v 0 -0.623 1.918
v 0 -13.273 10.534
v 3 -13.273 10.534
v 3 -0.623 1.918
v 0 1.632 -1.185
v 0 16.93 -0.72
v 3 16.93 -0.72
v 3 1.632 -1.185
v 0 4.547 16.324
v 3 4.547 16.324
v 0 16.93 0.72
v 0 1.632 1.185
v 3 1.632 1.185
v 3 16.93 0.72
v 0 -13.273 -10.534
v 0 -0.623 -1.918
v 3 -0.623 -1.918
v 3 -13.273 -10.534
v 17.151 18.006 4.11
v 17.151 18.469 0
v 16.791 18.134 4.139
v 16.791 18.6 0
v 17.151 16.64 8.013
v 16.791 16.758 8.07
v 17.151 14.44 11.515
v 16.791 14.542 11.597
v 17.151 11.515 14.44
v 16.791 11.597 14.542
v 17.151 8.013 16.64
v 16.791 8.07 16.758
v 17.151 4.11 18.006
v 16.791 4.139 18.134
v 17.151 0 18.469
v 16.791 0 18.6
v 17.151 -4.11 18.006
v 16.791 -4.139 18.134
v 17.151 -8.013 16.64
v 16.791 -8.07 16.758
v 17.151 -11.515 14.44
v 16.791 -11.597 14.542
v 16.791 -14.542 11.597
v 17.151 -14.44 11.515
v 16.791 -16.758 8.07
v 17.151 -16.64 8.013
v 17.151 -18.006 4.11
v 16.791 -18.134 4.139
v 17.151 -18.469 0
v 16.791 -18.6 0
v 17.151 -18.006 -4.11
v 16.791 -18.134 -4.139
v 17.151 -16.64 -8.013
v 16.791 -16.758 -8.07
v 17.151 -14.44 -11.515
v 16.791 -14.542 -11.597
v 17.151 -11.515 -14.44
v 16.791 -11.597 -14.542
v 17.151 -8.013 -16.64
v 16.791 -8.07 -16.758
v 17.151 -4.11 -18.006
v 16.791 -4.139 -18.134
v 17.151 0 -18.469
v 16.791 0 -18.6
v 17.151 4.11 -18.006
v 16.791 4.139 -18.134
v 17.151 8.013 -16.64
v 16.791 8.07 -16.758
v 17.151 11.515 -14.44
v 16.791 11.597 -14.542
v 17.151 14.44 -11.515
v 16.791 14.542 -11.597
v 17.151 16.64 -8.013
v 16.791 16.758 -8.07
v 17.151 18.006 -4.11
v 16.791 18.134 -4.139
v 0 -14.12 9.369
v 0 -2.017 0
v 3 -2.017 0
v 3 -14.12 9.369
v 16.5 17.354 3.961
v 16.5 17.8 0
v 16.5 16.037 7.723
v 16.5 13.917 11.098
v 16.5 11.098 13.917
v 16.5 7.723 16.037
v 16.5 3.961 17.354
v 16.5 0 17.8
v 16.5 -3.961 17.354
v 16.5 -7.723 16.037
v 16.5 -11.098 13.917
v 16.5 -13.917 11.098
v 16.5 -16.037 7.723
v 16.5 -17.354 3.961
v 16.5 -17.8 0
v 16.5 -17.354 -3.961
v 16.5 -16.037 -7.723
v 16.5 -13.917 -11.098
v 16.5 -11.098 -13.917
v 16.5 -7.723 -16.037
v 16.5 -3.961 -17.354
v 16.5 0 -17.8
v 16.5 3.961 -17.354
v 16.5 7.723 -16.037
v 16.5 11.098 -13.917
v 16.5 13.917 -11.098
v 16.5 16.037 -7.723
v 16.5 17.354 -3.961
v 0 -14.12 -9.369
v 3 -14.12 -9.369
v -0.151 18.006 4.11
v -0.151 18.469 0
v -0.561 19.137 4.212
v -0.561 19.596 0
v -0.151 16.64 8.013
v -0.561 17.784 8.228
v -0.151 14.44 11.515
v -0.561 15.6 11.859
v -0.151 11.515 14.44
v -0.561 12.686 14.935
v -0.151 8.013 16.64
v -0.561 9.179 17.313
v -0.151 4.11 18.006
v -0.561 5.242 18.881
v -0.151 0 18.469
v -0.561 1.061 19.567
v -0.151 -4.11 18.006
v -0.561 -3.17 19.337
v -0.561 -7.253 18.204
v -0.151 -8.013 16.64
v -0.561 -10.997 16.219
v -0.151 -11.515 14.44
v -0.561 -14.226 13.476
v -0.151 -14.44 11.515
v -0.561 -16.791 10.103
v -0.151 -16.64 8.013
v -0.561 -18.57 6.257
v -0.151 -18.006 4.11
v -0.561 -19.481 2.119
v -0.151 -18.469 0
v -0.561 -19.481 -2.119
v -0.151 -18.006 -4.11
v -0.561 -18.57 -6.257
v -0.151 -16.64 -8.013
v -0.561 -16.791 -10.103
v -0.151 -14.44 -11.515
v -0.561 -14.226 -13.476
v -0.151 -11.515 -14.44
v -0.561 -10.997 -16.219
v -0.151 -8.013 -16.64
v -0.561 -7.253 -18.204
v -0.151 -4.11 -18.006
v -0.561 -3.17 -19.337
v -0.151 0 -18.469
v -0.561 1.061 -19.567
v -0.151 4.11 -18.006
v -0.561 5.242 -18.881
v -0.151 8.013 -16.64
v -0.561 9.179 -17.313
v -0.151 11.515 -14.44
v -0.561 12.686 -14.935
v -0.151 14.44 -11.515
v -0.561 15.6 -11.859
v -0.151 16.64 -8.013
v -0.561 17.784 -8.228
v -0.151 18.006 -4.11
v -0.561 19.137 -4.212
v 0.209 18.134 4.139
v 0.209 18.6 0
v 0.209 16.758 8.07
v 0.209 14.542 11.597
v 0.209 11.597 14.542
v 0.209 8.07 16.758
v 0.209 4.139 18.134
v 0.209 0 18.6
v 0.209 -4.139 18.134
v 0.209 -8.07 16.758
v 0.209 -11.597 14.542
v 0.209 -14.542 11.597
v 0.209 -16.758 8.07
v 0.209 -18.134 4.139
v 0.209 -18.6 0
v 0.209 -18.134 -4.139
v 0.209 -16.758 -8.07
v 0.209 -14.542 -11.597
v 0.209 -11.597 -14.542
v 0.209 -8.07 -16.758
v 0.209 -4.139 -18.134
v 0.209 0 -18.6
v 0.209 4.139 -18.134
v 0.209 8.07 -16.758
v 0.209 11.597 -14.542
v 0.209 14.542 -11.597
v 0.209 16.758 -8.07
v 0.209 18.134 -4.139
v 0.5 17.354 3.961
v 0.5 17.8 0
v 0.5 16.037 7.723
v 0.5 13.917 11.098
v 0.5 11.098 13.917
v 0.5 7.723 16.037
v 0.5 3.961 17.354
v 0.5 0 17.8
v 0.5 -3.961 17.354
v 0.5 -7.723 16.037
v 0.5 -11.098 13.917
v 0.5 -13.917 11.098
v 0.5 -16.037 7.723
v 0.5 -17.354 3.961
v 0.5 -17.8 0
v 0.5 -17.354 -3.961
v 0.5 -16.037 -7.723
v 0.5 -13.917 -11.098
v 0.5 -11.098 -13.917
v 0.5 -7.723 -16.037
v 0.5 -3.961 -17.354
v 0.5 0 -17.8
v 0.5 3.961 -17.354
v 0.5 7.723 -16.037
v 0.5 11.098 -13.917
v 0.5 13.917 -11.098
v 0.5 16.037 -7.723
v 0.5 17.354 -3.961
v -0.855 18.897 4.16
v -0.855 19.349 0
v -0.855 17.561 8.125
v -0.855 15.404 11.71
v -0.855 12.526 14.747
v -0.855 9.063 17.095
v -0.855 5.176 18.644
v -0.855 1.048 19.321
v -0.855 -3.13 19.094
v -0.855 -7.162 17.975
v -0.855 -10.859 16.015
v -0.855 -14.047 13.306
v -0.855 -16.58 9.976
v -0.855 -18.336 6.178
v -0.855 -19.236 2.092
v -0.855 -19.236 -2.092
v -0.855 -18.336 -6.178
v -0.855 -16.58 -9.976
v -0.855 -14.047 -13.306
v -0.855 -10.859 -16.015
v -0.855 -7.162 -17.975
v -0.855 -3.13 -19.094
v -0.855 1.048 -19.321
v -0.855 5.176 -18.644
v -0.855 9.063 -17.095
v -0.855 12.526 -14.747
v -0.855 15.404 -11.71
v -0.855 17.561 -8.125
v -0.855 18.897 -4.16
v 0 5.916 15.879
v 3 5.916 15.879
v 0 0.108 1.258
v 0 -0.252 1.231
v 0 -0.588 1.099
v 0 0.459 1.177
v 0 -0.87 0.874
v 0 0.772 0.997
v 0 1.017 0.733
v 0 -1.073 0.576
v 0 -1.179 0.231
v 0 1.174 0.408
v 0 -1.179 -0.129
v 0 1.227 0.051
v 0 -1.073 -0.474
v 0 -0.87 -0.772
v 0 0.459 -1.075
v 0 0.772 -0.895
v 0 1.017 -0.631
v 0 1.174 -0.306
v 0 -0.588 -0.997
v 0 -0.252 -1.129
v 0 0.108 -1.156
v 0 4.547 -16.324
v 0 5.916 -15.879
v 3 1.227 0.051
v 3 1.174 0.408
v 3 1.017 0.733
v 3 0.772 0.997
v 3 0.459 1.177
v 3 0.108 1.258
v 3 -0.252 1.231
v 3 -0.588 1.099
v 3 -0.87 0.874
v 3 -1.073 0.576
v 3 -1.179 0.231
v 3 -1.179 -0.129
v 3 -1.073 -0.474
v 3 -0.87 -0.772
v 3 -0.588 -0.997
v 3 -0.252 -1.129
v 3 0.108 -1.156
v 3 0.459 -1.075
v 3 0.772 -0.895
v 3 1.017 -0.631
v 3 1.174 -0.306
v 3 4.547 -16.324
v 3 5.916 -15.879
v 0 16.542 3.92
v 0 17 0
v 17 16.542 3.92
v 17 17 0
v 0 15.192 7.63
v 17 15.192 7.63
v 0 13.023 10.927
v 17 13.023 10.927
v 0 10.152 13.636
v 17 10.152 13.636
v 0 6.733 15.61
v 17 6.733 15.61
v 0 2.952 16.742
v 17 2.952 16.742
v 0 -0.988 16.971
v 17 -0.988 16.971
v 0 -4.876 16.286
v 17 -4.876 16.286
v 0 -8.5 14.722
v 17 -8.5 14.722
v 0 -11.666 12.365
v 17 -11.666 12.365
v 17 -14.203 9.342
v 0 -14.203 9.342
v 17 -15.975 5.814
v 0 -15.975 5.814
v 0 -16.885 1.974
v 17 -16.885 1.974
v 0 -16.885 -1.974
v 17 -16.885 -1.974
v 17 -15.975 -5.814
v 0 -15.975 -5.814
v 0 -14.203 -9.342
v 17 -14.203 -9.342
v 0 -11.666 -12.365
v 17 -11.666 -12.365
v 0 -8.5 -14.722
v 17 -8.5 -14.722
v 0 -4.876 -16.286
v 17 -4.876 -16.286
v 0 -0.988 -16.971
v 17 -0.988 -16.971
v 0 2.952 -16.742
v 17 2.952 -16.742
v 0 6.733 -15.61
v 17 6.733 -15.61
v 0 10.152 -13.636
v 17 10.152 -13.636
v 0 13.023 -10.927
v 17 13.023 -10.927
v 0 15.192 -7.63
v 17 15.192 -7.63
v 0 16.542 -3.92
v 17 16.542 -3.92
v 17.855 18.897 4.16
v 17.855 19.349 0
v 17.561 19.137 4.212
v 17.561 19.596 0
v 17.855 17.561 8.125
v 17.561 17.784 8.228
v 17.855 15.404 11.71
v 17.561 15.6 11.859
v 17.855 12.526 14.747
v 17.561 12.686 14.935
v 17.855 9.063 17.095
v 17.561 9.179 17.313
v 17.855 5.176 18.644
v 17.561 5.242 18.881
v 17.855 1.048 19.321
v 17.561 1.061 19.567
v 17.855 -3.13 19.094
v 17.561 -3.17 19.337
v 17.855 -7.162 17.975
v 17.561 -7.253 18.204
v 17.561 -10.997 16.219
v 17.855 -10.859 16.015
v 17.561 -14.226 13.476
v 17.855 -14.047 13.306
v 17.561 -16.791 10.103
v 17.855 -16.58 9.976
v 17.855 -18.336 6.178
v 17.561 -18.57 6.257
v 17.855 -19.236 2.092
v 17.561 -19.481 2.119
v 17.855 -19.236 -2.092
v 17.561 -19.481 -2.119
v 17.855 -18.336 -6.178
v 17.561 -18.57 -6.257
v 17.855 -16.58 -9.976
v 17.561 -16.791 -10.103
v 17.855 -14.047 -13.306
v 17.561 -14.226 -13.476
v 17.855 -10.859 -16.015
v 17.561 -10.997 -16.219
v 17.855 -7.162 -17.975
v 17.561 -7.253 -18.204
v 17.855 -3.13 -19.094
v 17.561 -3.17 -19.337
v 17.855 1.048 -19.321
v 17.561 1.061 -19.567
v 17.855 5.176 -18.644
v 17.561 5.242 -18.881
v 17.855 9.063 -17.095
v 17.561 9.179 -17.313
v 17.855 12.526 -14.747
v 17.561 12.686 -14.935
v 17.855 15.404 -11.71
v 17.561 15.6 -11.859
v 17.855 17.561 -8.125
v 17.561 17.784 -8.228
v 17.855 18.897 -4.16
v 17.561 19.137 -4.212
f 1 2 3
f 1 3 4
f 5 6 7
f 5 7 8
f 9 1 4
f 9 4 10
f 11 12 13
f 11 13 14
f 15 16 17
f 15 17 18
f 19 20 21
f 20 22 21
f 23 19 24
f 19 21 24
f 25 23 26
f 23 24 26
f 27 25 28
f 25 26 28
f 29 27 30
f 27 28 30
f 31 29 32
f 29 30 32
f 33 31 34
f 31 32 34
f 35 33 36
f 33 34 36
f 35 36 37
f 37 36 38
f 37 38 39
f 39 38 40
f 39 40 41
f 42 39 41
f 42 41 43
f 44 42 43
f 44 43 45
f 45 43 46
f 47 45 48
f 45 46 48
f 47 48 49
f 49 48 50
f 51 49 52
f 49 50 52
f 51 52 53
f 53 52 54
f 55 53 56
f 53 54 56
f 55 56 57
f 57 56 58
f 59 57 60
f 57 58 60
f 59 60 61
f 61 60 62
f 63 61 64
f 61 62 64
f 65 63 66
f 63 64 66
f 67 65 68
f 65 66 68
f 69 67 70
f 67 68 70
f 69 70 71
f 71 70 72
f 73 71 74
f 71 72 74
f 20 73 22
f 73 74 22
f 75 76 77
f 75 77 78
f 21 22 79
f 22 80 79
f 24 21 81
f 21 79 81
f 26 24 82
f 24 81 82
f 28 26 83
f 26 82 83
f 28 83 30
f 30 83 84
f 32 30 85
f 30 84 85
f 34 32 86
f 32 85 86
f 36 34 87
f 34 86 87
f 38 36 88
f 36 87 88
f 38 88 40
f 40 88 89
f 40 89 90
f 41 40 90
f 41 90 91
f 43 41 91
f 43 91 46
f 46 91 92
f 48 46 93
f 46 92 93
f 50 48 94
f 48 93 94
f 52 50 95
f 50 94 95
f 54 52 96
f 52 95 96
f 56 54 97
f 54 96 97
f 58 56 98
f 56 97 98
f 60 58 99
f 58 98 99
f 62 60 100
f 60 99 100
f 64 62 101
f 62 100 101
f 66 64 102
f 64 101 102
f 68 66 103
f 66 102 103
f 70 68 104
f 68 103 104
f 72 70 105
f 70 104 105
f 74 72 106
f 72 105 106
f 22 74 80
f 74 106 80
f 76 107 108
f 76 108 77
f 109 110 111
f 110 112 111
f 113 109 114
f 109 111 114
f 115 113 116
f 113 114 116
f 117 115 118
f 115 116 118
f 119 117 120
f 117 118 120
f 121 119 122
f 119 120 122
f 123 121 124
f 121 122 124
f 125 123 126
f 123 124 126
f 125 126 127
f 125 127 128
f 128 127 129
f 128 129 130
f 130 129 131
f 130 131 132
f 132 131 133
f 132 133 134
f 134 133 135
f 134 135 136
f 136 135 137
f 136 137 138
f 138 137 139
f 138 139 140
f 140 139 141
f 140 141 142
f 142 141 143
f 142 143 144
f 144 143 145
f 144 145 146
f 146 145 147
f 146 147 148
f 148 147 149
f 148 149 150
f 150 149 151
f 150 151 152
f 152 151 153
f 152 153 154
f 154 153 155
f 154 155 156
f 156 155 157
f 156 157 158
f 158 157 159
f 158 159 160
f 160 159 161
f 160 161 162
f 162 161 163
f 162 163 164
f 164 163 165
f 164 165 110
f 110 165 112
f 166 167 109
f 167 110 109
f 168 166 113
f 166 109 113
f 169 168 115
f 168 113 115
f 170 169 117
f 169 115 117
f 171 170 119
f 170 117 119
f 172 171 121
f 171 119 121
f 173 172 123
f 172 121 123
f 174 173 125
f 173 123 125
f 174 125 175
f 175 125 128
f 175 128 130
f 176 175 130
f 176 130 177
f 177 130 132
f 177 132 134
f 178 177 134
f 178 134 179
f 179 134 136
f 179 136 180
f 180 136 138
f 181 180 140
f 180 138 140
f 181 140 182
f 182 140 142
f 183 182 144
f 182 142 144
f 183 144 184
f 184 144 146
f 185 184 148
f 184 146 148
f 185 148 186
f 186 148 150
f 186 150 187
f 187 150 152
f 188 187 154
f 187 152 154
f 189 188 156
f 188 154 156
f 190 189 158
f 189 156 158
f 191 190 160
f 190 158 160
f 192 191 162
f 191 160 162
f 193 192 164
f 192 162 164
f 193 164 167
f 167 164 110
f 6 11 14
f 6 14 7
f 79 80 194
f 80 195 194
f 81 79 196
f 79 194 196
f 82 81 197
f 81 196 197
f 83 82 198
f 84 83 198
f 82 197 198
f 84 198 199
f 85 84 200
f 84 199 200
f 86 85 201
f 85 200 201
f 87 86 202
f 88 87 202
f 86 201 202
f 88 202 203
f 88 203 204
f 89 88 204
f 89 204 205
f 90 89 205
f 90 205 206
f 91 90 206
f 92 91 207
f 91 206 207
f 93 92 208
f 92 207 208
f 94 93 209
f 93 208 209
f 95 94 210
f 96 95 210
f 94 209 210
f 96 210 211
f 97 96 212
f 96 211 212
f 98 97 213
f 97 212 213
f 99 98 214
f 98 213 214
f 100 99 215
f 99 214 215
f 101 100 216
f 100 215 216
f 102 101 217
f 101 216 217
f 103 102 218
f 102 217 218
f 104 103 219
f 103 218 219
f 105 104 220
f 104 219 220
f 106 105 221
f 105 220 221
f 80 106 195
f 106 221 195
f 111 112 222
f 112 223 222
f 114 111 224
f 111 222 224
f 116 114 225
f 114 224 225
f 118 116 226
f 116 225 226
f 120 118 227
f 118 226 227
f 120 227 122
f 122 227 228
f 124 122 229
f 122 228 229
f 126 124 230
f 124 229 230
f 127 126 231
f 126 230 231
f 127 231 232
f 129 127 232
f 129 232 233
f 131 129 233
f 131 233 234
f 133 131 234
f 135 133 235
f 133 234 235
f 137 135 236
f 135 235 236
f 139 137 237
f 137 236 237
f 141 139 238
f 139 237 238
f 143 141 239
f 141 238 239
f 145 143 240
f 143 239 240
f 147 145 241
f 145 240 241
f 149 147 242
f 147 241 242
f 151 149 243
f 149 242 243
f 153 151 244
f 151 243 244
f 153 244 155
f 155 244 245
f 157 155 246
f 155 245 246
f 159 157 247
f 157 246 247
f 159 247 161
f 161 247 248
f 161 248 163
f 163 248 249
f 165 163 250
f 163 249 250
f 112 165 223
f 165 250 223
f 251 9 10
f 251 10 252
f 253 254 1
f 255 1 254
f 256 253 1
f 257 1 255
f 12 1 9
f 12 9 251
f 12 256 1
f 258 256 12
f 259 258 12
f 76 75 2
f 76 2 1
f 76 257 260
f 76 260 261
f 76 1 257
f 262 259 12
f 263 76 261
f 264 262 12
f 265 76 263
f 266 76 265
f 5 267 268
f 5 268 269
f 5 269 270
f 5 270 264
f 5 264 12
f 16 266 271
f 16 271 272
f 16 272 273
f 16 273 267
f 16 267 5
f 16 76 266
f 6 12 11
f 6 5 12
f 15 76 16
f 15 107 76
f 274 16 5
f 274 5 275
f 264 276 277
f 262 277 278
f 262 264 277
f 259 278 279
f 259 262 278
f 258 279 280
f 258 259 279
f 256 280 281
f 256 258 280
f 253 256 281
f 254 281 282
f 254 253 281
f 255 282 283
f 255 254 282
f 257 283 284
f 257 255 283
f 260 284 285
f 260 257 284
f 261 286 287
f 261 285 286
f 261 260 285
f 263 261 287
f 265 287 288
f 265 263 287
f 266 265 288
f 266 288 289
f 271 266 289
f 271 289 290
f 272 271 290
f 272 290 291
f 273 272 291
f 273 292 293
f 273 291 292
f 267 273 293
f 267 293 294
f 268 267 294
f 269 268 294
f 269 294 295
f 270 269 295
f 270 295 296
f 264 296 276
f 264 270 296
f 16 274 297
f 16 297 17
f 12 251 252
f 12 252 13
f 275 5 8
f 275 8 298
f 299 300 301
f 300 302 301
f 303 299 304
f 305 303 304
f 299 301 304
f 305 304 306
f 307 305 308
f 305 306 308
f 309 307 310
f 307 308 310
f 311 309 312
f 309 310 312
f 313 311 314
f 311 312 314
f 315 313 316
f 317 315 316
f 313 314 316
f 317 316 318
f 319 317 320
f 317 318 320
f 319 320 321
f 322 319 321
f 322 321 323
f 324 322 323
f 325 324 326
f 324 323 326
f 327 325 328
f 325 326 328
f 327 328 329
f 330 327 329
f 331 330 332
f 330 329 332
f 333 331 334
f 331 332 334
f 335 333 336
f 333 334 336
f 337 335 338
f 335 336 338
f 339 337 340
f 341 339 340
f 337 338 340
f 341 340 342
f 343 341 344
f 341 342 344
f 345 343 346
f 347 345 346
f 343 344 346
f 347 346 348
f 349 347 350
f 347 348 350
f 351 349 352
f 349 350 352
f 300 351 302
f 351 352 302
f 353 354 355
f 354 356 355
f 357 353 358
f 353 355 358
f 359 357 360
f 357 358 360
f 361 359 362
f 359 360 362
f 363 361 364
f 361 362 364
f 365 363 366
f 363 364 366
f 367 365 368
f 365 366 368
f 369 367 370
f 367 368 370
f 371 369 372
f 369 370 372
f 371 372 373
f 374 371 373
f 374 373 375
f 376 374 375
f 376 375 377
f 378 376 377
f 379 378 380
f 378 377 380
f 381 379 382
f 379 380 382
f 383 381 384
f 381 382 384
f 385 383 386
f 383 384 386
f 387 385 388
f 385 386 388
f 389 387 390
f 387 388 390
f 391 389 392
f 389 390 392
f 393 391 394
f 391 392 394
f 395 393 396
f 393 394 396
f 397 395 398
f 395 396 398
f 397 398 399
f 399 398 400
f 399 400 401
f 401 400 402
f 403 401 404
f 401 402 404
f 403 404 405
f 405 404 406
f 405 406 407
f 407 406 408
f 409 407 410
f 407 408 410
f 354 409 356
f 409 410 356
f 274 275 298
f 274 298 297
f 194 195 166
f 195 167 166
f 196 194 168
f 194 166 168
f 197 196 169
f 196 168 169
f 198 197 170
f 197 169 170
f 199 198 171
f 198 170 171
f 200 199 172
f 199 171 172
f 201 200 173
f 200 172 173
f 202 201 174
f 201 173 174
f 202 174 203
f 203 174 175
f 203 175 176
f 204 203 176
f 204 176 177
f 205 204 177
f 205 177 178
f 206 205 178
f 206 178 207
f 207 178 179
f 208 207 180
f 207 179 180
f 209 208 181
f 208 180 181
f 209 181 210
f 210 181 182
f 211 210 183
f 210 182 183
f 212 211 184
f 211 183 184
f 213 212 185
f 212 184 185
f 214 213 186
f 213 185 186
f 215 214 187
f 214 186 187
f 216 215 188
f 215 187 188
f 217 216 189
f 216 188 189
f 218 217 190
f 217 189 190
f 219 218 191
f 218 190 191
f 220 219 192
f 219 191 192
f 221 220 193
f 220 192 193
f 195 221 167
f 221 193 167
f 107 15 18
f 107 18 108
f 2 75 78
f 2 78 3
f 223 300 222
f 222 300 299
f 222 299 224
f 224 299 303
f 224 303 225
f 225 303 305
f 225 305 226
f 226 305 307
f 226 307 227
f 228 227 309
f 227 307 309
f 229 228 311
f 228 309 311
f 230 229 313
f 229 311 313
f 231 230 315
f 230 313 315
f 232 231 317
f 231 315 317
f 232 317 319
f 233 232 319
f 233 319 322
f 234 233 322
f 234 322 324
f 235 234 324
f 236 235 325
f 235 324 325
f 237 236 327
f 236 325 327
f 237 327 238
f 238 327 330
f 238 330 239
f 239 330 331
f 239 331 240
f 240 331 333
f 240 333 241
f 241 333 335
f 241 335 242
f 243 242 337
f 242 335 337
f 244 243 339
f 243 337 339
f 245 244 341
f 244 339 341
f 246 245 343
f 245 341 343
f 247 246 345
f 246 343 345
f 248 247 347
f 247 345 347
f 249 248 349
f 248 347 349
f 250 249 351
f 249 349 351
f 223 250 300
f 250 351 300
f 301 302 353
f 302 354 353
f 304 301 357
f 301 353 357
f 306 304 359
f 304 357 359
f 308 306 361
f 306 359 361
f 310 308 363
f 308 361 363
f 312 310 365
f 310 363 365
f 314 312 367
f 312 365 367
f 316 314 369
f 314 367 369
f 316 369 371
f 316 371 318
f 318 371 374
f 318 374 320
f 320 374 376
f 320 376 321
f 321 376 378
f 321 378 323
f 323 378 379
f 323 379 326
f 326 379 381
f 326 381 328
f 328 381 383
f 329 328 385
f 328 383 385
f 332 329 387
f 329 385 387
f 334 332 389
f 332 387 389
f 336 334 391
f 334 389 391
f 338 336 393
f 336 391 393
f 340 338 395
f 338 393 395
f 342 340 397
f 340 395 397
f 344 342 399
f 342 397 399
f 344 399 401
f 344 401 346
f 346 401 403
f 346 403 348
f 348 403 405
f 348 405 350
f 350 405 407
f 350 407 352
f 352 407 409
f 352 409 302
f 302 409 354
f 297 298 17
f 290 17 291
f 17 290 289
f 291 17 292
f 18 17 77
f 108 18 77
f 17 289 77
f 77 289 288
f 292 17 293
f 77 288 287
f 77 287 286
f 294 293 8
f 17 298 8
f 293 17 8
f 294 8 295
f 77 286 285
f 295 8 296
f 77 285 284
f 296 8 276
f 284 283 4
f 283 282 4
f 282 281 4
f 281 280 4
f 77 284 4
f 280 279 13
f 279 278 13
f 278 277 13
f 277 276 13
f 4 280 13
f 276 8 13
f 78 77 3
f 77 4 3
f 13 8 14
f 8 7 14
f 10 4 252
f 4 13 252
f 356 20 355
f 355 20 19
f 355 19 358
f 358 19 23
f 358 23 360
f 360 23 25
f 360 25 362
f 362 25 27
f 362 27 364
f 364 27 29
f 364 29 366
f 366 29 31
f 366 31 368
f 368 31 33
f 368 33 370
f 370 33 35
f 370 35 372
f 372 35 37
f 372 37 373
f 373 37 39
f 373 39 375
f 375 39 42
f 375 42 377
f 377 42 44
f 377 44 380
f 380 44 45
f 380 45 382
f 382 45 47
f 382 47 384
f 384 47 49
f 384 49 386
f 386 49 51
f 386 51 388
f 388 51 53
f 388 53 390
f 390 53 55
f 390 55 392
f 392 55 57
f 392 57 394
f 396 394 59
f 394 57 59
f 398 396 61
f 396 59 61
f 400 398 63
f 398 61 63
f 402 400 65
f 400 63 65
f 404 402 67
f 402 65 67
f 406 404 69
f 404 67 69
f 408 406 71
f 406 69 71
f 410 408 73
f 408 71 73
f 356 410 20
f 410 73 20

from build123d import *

# Parameters (mm, degrees)
PAD_DEPTH          = 3
POLARPATTERN_COUNT = 5
SKETCH003_R        = 1.21
POCKET_DEPTH       = 5


with BuildPart() as body:
    # Sketch → Revolution (revolve)
    with BuildSketch(Plane.XY):
        Polygon((-0.85505, 19.349232), (0, 17), (17, 17), (17.85505, 19.349232), (17.561434, 19.595605), (17.15135, 18.468908), (16.791176, 18.6), (16.5, 17.8), (0.5, 17.8), (0.208824, 18.6), (-0.15135, 18.468908), (-0.561434, 19.595605), align=None)
    revolve(axis=Axis((0, 0, 0), (1, 0, 0)))


with BuildPart() as body001:
    # Sketch002 → Pad (new body)
    with BuildSketch(Plane.YZ):
        Polygon((0, 1.235), (16.93, 0.72), (16.93, -0.72), (0, -1.235), align=None)
    pad = extrude(amount=PAD_DEPTH)

    # PolarPattern: Pad ×5 about axis
    polarpattern_axis = Axis((0, 0, 0), (1, 0, 0))
    for i in range(1, POLARPATTERN_COUNT):
        add(pad.rotate(polarpattern_axis, i * 360 / POLARPATTERN_COUNT))

    # Sketch003 → Pocket (cut)
    with BuildSketch(Plane.YZ):
        with Locations((0.017273, 0.050977)):
            Circle(SKETCH003_R)
    extrude(amount=POCKET_DEPTH, mode=Mode.SUBTRACT)


solid = Compound([body.part, body001.part])
